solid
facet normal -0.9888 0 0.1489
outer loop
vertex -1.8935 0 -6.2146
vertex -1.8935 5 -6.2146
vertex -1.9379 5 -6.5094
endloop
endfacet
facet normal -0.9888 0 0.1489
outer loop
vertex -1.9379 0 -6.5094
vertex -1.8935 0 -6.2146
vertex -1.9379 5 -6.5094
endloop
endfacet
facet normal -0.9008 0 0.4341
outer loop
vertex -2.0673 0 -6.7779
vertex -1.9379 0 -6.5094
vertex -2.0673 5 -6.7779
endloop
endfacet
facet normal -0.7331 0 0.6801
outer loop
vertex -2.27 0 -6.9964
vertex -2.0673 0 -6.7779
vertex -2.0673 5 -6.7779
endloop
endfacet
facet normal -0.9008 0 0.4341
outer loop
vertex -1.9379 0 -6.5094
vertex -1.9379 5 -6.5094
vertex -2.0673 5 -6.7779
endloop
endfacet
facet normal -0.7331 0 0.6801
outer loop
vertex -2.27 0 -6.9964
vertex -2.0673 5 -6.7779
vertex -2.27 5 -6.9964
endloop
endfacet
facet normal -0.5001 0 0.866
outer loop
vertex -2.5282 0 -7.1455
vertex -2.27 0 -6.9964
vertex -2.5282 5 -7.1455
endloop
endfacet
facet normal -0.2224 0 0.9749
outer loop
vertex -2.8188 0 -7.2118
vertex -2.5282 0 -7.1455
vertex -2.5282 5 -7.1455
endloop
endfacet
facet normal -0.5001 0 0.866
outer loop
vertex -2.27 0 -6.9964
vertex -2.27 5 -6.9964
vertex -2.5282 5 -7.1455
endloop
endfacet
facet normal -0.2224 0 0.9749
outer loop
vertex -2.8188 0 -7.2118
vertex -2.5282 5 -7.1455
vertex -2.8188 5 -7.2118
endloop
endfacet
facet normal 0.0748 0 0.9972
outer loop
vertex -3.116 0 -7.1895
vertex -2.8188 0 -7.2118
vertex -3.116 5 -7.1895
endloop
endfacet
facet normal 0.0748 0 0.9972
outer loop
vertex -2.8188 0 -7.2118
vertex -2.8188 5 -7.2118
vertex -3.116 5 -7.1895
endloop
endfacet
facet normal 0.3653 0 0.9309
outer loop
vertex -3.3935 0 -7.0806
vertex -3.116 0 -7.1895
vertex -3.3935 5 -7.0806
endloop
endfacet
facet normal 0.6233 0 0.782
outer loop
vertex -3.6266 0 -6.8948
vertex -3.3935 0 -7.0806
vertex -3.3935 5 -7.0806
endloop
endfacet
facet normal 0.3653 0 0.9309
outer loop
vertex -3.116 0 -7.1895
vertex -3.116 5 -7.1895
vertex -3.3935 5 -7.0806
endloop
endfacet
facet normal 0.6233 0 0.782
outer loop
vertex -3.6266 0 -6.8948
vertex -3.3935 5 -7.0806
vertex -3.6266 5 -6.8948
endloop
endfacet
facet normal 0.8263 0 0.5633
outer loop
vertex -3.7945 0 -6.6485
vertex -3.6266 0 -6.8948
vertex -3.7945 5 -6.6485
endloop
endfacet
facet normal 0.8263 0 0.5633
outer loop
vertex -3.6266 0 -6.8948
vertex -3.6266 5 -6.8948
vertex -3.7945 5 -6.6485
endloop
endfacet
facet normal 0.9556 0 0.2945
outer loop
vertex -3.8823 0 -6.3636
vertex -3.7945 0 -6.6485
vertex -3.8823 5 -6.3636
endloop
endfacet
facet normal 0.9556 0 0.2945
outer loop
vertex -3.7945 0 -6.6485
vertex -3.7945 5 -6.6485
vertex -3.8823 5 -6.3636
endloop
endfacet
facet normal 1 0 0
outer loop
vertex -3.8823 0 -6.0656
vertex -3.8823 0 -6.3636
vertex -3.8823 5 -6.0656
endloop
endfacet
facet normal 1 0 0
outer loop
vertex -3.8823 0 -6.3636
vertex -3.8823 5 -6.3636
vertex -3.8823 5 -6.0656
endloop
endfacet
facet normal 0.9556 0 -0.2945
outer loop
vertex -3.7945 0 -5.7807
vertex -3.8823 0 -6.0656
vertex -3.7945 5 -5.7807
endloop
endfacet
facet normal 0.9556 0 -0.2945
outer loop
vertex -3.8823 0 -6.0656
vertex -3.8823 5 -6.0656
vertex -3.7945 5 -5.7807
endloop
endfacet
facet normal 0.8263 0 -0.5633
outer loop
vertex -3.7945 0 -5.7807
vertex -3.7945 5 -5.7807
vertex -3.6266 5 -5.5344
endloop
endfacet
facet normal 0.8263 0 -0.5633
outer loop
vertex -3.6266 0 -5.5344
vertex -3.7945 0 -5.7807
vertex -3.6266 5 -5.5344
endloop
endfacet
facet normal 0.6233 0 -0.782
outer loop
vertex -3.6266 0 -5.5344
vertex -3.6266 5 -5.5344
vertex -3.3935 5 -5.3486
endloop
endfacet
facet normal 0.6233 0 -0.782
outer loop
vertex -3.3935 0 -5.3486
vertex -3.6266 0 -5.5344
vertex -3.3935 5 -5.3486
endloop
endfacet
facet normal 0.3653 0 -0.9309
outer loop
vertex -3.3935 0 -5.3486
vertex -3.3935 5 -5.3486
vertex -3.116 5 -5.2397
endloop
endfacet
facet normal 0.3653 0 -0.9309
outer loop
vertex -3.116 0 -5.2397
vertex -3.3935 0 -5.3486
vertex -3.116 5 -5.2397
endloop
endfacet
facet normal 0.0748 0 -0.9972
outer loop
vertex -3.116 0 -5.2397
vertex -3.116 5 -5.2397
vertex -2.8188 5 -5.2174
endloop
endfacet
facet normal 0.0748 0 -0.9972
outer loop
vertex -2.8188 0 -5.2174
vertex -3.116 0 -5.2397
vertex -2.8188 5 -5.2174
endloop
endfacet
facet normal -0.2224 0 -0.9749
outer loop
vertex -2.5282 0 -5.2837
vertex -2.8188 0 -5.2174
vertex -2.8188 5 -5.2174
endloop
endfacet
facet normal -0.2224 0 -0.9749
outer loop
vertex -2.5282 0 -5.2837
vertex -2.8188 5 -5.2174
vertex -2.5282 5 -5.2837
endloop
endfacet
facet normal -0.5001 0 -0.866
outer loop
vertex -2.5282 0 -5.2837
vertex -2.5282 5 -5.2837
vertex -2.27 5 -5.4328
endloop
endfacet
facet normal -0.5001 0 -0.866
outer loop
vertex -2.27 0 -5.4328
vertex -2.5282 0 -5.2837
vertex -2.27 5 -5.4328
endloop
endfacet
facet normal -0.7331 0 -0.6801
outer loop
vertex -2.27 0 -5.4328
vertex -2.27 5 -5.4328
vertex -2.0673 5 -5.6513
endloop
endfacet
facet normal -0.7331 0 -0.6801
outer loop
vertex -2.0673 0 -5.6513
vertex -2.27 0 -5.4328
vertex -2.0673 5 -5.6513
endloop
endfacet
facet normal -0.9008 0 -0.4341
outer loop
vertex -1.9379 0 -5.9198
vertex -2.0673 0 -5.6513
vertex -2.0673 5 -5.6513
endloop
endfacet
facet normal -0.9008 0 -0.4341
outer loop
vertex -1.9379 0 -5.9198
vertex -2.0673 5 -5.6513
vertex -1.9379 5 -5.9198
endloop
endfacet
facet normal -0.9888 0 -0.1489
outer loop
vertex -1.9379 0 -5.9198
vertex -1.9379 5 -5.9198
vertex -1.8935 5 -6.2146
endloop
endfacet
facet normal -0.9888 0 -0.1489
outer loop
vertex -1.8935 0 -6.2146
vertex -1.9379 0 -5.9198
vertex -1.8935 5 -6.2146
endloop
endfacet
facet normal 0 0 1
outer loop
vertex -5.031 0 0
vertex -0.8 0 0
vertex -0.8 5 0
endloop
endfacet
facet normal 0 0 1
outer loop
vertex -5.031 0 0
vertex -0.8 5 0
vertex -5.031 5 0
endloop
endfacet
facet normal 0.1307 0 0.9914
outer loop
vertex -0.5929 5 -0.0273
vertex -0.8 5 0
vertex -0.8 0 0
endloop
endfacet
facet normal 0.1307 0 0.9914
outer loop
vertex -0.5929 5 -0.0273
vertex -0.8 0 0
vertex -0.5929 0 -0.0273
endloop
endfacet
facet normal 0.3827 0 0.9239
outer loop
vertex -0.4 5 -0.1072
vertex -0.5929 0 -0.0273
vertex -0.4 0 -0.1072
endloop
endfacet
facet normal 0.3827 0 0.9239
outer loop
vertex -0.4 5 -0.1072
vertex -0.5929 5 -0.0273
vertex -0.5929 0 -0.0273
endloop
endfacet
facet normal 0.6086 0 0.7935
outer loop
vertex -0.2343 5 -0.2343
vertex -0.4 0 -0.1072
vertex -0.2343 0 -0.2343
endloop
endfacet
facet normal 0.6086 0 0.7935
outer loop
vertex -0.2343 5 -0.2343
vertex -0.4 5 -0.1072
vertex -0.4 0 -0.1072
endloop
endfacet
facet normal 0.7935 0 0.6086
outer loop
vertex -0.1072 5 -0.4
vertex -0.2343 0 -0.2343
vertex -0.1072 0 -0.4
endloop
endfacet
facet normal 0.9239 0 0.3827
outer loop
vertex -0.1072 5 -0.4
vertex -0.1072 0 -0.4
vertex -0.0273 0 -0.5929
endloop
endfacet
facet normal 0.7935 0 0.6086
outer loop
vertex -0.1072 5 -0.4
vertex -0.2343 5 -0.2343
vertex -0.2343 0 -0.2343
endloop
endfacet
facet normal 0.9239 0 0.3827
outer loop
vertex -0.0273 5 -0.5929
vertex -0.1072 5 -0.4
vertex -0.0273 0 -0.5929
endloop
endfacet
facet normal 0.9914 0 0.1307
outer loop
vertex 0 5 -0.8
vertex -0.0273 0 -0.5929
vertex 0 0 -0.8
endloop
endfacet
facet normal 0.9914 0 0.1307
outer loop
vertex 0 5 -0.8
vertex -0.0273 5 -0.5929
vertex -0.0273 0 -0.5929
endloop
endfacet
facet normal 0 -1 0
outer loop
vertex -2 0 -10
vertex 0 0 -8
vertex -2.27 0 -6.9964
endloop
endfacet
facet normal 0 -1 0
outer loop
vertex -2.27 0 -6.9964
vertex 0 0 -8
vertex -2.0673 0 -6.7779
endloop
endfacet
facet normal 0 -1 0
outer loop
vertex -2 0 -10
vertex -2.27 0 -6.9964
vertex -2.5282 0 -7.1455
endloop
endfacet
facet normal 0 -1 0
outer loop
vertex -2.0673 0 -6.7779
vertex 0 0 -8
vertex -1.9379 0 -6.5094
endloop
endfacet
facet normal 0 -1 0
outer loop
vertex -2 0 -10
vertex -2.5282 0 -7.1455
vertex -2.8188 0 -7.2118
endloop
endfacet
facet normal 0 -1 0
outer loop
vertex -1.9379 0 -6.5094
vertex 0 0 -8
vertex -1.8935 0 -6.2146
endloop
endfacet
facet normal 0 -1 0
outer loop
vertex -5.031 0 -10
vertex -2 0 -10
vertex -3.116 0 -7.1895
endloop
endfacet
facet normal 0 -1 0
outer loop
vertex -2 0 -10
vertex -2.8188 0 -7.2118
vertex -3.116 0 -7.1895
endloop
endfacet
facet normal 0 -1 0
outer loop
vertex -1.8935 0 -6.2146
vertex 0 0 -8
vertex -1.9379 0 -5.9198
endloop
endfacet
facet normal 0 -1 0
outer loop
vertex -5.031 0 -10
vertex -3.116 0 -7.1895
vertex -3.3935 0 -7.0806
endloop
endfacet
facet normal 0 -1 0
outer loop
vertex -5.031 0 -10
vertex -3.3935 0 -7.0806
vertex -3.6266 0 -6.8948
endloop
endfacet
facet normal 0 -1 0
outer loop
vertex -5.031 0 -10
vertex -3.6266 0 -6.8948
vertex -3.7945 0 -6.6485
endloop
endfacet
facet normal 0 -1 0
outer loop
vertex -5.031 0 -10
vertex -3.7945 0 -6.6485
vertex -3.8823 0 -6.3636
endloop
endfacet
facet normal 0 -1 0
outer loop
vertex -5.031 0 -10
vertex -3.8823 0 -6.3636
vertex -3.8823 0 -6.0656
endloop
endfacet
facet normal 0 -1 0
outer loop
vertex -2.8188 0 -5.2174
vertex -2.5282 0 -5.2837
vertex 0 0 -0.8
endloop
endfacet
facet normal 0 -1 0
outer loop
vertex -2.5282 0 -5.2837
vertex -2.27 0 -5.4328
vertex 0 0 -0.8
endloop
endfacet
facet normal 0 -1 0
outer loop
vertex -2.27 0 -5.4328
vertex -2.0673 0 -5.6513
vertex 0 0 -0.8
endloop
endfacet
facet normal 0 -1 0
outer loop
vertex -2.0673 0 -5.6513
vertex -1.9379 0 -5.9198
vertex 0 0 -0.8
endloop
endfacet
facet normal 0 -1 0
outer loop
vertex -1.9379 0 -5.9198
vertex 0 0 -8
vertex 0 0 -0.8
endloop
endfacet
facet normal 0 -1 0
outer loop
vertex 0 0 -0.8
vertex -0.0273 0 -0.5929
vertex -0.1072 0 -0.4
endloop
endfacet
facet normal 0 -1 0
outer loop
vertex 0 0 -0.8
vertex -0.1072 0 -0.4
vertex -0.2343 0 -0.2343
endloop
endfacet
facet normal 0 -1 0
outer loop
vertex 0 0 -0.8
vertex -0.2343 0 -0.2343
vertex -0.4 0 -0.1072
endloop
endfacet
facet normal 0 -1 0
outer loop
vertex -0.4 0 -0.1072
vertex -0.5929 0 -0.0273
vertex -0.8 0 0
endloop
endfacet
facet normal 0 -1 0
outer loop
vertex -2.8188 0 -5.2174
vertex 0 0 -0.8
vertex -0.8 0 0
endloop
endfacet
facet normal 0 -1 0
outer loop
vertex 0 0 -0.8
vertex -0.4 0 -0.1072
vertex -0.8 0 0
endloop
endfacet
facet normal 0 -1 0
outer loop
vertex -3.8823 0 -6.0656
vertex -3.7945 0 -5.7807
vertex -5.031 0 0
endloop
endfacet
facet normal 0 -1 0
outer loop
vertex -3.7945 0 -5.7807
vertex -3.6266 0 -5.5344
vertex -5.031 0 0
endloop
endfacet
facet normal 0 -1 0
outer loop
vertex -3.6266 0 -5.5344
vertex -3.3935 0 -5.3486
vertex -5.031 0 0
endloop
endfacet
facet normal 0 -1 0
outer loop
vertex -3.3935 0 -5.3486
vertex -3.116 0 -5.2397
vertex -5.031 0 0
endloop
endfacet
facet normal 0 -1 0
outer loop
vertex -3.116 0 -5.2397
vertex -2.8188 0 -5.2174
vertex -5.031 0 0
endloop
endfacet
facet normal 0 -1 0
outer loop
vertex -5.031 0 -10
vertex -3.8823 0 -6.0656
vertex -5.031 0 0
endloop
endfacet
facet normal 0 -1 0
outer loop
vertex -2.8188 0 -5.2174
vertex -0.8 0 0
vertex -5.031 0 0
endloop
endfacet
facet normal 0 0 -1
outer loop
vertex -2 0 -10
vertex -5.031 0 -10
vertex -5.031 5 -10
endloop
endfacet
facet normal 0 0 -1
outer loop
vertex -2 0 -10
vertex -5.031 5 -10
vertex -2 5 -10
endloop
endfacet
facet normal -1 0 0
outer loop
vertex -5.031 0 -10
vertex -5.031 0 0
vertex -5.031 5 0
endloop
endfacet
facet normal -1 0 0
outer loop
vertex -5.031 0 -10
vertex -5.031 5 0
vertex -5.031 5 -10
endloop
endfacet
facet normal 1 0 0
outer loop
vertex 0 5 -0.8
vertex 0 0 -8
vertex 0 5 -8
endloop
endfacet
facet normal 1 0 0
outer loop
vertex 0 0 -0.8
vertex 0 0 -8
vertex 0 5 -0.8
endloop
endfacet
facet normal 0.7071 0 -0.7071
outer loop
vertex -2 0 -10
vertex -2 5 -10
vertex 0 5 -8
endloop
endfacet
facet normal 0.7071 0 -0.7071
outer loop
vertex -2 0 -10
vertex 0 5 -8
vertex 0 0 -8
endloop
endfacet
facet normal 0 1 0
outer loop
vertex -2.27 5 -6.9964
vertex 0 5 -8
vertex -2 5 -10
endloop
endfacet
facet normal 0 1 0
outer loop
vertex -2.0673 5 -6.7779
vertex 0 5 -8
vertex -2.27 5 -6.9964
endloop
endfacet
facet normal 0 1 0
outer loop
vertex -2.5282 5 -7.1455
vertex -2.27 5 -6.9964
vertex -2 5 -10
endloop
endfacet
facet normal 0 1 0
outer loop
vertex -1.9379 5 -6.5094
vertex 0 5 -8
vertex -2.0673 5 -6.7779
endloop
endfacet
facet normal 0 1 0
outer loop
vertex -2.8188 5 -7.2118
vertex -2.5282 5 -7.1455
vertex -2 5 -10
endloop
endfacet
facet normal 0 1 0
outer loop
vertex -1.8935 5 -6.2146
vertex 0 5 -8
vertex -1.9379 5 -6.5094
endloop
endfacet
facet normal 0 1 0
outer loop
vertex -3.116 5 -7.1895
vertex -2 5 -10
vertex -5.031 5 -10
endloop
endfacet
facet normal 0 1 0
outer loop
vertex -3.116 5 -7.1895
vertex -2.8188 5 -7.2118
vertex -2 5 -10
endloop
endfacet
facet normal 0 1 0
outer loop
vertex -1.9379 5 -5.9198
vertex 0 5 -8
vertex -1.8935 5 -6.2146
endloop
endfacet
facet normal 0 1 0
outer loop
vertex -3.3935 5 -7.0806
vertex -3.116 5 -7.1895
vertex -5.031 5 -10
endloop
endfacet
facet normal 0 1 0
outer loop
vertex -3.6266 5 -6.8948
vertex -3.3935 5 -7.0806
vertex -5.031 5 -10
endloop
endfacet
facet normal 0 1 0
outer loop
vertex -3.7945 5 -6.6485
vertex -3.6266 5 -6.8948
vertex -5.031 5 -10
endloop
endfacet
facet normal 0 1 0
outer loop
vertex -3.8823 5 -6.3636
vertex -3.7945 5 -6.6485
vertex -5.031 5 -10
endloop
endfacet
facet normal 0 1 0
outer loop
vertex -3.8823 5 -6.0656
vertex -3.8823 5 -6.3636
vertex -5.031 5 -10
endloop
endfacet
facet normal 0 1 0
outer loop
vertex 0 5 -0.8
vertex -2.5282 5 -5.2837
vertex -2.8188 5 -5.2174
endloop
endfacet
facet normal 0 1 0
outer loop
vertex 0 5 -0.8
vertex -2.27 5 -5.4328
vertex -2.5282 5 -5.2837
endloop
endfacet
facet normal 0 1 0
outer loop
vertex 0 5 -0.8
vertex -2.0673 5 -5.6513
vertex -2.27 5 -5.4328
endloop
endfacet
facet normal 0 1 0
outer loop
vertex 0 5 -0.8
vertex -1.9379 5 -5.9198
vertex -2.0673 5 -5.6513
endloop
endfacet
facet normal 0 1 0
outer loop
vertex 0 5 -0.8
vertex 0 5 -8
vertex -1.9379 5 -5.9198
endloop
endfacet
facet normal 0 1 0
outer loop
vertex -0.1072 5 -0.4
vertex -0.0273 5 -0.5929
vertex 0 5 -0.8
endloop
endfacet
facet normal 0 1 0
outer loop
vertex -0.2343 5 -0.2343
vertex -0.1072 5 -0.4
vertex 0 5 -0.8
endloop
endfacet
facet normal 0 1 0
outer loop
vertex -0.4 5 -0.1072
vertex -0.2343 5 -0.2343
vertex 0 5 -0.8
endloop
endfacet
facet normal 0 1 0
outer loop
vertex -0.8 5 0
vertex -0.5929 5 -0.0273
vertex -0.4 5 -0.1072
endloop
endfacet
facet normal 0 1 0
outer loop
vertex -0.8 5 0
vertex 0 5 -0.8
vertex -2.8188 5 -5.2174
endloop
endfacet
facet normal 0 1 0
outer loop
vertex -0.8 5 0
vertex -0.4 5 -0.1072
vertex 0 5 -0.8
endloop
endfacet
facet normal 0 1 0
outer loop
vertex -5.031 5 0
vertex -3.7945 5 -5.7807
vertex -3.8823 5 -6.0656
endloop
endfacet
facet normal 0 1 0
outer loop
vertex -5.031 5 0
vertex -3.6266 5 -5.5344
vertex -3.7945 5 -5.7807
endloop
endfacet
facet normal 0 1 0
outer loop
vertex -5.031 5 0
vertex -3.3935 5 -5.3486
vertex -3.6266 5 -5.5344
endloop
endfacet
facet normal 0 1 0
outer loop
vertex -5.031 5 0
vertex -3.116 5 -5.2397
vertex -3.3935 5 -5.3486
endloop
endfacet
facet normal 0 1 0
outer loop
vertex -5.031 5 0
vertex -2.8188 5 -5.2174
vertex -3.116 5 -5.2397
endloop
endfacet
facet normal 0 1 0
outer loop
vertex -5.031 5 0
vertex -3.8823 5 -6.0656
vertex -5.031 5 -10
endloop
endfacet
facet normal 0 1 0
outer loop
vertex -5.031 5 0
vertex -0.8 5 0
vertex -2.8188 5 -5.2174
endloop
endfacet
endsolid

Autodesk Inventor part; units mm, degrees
ref_plane "YZ Plane" through (0, 0, 0) normal (1, 0, 0) x (0, 1, 0)
ref_plane "XZ Plane" through (0, 0, 0) normal (0, 1, 0) x (-1, 0, 0)
ref_plane "XY Plane" through (0, 0, 0) normal (0, 0, 1) x (1, 0, 0)
sketch "Sketch1" plane through (0, 0, 0) normal (0, 1, 0) x (-1, 0, 0)
  line L0 (0, 0) -> (5.031, 0)
  line L1 (5.031, 0) -> (5.031, -10)
  line L2 (5.031, -10) -> (0, -10)
  line L3 (0, -10) -> (0, 0)
  dimension "d0" = 10
extrude "Extrusion1" add sketch "Sketch1" along normal blind 5
sketch "Sketch2" plane through (0, 5, 0) normal (0, 1, 0) x (1, 0, 0)
  point P0 (0, 0)
sketch "Sketch3" plane through (0, 5, 0) normal (0, 1, 0) x (1, 0, 0)
  circle A0 centre (-2.8935, 6.2146) radius 1
  point P0 (0, 0)
  dimension "d14" = 2
extrude "Extrusion2" cut sketch "Sketch3" against normal blind 5
fillet "Fillet1" radius 0.8 1 edges at (0, 2.5, 0)
chamfer "Chamfer1" distance 2 angle 45 1 edges at (0, 2.5, -10)
sketch "Sketch4" plane through (0, 5, 0) normal (0, 1, 0) x (1, 0, 0)
  line L0 (-5.031, 0) -> (-0.8, 0) construction
  line L1 (-5.031, 0) -> (-5.031, 5.2141) construction
  line L2 (-5.031, 5.2141) -> (-0.484, 5.2141) construction
  line L3 (-0.484, 5.2141) -> (-0.484, 0) construction
  line L4 (-0.484, 0) -> (-3.3034, 3.9743) construction
  line L5 (-3.3034, 3.9743) -> (-0.484, 5.2141) construction
  line L6 (-5.031, 0) -> (-5.031, 3) construction
  line L7 (-5.031, 10) -> (-5.031, 0) construction
  line L8 (-5.031, 3) -> (-2.031, 3) construction
  circle A0 centre (-2.031, 3) radius 1 construction
  circle A1 centre (-2.031, 3) radius 1
  point P0 (0, 0)
  dimension "d9" = 3
  dimension "d10" = 3
  dimension "d11" = 90
  dimension "d12" = 2
  dimension "d13" = 2
properties part number "testpart"
